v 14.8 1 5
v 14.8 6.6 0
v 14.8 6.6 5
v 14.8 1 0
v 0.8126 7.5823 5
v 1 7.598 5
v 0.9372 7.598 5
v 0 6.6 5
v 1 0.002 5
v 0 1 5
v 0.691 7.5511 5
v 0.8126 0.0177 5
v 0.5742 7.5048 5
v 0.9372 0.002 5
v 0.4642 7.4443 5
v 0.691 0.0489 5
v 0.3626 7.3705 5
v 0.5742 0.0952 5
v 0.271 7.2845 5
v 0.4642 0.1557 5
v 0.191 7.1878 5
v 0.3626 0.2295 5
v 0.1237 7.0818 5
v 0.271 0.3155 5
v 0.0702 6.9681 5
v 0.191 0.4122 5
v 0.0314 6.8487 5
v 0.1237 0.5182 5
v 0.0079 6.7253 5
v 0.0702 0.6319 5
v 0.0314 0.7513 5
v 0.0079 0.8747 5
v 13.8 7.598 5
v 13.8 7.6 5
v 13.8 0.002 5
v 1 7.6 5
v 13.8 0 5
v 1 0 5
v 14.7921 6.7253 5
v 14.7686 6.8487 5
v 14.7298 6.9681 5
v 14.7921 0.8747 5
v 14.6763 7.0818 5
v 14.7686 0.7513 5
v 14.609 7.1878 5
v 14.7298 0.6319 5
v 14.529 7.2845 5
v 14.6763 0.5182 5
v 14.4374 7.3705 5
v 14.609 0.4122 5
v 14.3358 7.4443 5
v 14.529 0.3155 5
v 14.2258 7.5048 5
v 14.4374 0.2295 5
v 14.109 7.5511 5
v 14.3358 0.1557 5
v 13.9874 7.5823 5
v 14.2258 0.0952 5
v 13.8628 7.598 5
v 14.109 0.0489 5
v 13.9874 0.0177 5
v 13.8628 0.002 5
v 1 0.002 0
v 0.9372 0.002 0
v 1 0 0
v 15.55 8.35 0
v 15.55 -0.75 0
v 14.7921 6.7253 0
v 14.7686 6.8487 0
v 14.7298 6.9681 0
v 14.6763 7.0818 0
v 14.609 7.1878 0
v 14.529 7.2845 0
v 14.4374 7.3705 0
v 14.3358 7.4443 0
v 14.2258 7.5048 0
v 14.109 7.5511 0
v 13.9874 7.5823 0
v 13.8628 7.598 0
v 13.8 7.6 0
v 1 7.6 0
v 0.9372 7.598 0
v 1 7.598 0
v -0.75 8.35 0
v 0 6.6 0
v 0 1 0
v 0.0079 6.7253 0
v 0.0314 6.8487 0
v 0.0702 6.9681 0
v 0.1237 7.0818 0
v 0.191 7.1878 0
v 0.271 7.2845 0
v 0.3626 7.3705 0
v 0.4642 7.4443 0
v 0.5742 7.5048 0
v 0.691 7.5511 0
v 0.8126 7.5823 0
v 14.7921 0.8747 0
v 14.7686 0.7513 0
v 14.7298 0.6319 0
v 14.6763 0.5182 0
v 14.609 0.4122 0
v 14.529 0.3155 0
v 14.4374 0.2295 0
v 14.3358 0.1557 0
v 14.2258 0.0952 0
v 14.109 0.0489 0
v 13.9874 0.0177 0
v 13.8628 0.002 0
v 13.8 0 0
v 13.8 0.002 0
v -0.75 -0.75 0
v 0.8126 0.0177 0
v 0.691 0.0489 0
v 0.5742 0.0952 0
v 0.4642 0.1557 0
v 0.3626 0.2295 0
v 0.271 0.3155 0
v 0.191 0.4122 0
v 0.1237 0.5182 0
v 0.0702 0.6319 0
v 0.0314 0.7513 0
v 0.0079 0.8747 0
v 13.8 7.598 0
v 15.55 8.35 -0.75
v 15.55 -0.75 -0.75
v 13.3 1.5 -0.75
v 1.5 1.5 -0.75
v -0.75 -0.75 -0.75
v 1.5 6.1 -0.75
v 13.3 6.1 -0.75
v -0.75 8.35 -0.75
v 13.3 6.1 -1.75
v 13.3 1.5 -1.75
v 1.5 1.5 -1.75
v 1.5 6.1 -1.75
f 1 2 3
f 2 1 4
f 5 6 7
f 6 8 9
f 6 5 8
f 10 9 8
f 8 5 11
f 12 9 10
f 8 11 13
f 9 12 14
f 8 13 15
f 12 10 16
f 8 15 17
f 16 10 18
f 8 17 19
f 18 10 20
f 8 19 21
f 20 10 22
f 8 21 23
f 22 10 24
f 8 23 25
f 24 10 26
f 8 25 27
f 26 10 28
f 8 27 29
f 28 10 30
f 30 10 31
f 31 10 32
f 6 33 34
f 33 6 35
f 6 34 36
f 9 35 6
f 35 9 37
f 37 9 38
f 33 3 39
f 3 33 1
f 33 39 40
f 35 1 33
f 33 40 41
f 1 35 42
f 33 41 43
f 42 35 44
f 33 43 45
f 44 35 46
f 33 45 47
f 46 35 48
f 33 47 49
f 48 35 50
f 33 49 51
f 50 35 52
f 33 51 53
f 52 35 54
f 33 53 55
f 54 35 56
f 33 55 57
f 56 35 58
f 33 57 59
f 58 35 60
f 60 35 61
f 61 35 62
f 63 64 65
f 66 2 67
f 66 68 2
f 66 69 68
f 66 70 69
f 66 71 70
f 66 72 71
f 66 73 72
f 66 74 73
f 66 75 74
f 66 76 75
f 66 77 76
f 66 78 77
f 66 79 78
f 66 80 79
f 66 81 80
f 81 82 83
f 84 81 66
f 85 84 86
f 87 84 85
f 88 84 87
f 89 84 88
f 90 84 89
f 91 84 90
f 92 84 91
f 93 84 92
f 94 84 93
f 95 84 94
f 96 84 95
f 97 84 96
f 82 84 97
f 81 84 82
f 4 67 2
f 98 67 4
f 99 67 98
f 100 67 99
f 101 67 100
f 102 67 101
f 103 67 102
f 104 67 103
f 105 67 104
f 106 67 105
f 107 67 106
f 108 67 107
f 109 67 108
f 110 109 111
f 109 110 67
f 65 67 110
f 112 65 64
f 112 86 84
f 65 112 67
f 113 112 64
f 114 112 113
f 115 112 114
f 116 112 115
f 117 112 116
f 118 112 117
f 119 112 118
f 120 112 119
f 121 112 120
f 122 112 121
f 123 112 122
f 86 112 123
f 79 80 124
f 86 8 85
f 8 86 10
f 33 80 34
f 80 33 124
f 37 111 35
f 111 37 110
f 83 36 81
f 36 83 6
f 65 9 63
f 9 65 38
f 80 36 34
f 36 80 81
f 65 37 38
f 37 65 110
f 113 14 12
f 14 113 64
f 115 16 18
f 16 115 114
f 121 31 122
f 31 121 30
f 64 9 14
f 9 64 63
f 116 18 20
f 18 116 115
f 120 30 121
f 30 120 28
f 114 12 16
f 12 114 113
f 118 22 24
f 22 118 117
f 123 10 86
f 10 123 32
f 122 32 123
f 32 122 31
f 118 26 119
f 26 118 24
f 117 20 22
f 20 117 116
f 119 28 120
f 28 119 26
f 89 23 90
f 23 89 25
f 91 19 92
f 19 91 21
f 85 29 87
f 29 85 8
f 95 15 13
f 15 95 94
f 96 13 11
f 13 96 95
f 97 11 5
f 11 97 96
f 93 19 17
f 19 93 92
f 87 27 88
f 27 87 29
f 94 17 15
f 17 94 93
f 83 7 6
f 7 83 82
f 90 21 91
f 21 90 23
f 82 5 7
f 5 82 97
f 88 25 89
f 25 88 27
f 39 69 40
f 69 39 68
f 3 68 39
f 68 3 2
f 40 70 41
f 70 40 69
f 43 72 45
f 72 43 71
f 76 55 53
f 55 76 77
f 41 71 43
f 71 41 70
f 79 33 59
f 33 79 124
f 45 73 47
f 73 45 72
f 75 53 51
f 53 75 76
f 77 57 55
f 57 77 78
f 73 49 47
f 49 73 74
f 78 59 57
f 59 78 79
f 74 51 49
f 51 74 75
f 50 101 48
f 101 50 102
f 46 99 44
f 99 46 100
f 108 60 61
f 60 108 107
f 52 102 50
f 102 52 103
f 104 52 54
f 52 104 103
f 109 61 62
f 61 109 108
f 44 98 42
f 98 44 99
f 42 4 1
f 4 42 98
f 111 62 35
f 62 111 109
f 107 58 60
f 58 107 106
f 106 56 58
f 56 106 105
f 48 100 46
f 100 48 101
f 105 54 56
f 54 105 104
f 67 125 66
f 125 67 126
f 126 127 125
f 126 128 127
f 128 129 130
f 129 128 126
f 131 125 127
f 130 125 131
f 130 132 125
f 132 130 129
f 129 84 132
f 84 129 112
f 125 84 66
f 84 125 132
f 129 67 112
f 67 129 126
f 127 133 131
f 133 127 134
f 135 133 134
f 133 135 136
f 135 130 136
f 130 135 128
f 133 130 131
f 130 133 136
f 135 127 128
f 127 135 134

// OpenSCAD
clearance = 0.2;
l = 15 - clearance;
w = 7.8 - clearance;
h = 5;
r = 1;
b = 0.75;
h2 = 1;

//rb = r+b;
//lb = l+b;
//wb = w+b;

$fn = 50;




union(){
    
//length cube
translate([0, r, 0])
cube([l, w-(r*2), h]);

//width cube
translate([r, 0,0])
cube([l-(r*2), w, h]);

//radius corner
translate([r, r, 0])
cylinder(h, r, r);

//radius corner
translate([r, w-r, 0])
cylinder(h, r, r);

//radius corner
translate([l-r, w-r, 0])
cylinder(h, r, r);

//radius corner
translate([l-r, r, 0])
cylinder(h, r, r);

//brim
translate([-b, -b, -b])
cube([l+(b*2), w+(b*2), b]);

//contact cube
translate([b*2,b*2,-(b+h2)])
cube([l-(b*4), w-(b*4), h2]);
}
